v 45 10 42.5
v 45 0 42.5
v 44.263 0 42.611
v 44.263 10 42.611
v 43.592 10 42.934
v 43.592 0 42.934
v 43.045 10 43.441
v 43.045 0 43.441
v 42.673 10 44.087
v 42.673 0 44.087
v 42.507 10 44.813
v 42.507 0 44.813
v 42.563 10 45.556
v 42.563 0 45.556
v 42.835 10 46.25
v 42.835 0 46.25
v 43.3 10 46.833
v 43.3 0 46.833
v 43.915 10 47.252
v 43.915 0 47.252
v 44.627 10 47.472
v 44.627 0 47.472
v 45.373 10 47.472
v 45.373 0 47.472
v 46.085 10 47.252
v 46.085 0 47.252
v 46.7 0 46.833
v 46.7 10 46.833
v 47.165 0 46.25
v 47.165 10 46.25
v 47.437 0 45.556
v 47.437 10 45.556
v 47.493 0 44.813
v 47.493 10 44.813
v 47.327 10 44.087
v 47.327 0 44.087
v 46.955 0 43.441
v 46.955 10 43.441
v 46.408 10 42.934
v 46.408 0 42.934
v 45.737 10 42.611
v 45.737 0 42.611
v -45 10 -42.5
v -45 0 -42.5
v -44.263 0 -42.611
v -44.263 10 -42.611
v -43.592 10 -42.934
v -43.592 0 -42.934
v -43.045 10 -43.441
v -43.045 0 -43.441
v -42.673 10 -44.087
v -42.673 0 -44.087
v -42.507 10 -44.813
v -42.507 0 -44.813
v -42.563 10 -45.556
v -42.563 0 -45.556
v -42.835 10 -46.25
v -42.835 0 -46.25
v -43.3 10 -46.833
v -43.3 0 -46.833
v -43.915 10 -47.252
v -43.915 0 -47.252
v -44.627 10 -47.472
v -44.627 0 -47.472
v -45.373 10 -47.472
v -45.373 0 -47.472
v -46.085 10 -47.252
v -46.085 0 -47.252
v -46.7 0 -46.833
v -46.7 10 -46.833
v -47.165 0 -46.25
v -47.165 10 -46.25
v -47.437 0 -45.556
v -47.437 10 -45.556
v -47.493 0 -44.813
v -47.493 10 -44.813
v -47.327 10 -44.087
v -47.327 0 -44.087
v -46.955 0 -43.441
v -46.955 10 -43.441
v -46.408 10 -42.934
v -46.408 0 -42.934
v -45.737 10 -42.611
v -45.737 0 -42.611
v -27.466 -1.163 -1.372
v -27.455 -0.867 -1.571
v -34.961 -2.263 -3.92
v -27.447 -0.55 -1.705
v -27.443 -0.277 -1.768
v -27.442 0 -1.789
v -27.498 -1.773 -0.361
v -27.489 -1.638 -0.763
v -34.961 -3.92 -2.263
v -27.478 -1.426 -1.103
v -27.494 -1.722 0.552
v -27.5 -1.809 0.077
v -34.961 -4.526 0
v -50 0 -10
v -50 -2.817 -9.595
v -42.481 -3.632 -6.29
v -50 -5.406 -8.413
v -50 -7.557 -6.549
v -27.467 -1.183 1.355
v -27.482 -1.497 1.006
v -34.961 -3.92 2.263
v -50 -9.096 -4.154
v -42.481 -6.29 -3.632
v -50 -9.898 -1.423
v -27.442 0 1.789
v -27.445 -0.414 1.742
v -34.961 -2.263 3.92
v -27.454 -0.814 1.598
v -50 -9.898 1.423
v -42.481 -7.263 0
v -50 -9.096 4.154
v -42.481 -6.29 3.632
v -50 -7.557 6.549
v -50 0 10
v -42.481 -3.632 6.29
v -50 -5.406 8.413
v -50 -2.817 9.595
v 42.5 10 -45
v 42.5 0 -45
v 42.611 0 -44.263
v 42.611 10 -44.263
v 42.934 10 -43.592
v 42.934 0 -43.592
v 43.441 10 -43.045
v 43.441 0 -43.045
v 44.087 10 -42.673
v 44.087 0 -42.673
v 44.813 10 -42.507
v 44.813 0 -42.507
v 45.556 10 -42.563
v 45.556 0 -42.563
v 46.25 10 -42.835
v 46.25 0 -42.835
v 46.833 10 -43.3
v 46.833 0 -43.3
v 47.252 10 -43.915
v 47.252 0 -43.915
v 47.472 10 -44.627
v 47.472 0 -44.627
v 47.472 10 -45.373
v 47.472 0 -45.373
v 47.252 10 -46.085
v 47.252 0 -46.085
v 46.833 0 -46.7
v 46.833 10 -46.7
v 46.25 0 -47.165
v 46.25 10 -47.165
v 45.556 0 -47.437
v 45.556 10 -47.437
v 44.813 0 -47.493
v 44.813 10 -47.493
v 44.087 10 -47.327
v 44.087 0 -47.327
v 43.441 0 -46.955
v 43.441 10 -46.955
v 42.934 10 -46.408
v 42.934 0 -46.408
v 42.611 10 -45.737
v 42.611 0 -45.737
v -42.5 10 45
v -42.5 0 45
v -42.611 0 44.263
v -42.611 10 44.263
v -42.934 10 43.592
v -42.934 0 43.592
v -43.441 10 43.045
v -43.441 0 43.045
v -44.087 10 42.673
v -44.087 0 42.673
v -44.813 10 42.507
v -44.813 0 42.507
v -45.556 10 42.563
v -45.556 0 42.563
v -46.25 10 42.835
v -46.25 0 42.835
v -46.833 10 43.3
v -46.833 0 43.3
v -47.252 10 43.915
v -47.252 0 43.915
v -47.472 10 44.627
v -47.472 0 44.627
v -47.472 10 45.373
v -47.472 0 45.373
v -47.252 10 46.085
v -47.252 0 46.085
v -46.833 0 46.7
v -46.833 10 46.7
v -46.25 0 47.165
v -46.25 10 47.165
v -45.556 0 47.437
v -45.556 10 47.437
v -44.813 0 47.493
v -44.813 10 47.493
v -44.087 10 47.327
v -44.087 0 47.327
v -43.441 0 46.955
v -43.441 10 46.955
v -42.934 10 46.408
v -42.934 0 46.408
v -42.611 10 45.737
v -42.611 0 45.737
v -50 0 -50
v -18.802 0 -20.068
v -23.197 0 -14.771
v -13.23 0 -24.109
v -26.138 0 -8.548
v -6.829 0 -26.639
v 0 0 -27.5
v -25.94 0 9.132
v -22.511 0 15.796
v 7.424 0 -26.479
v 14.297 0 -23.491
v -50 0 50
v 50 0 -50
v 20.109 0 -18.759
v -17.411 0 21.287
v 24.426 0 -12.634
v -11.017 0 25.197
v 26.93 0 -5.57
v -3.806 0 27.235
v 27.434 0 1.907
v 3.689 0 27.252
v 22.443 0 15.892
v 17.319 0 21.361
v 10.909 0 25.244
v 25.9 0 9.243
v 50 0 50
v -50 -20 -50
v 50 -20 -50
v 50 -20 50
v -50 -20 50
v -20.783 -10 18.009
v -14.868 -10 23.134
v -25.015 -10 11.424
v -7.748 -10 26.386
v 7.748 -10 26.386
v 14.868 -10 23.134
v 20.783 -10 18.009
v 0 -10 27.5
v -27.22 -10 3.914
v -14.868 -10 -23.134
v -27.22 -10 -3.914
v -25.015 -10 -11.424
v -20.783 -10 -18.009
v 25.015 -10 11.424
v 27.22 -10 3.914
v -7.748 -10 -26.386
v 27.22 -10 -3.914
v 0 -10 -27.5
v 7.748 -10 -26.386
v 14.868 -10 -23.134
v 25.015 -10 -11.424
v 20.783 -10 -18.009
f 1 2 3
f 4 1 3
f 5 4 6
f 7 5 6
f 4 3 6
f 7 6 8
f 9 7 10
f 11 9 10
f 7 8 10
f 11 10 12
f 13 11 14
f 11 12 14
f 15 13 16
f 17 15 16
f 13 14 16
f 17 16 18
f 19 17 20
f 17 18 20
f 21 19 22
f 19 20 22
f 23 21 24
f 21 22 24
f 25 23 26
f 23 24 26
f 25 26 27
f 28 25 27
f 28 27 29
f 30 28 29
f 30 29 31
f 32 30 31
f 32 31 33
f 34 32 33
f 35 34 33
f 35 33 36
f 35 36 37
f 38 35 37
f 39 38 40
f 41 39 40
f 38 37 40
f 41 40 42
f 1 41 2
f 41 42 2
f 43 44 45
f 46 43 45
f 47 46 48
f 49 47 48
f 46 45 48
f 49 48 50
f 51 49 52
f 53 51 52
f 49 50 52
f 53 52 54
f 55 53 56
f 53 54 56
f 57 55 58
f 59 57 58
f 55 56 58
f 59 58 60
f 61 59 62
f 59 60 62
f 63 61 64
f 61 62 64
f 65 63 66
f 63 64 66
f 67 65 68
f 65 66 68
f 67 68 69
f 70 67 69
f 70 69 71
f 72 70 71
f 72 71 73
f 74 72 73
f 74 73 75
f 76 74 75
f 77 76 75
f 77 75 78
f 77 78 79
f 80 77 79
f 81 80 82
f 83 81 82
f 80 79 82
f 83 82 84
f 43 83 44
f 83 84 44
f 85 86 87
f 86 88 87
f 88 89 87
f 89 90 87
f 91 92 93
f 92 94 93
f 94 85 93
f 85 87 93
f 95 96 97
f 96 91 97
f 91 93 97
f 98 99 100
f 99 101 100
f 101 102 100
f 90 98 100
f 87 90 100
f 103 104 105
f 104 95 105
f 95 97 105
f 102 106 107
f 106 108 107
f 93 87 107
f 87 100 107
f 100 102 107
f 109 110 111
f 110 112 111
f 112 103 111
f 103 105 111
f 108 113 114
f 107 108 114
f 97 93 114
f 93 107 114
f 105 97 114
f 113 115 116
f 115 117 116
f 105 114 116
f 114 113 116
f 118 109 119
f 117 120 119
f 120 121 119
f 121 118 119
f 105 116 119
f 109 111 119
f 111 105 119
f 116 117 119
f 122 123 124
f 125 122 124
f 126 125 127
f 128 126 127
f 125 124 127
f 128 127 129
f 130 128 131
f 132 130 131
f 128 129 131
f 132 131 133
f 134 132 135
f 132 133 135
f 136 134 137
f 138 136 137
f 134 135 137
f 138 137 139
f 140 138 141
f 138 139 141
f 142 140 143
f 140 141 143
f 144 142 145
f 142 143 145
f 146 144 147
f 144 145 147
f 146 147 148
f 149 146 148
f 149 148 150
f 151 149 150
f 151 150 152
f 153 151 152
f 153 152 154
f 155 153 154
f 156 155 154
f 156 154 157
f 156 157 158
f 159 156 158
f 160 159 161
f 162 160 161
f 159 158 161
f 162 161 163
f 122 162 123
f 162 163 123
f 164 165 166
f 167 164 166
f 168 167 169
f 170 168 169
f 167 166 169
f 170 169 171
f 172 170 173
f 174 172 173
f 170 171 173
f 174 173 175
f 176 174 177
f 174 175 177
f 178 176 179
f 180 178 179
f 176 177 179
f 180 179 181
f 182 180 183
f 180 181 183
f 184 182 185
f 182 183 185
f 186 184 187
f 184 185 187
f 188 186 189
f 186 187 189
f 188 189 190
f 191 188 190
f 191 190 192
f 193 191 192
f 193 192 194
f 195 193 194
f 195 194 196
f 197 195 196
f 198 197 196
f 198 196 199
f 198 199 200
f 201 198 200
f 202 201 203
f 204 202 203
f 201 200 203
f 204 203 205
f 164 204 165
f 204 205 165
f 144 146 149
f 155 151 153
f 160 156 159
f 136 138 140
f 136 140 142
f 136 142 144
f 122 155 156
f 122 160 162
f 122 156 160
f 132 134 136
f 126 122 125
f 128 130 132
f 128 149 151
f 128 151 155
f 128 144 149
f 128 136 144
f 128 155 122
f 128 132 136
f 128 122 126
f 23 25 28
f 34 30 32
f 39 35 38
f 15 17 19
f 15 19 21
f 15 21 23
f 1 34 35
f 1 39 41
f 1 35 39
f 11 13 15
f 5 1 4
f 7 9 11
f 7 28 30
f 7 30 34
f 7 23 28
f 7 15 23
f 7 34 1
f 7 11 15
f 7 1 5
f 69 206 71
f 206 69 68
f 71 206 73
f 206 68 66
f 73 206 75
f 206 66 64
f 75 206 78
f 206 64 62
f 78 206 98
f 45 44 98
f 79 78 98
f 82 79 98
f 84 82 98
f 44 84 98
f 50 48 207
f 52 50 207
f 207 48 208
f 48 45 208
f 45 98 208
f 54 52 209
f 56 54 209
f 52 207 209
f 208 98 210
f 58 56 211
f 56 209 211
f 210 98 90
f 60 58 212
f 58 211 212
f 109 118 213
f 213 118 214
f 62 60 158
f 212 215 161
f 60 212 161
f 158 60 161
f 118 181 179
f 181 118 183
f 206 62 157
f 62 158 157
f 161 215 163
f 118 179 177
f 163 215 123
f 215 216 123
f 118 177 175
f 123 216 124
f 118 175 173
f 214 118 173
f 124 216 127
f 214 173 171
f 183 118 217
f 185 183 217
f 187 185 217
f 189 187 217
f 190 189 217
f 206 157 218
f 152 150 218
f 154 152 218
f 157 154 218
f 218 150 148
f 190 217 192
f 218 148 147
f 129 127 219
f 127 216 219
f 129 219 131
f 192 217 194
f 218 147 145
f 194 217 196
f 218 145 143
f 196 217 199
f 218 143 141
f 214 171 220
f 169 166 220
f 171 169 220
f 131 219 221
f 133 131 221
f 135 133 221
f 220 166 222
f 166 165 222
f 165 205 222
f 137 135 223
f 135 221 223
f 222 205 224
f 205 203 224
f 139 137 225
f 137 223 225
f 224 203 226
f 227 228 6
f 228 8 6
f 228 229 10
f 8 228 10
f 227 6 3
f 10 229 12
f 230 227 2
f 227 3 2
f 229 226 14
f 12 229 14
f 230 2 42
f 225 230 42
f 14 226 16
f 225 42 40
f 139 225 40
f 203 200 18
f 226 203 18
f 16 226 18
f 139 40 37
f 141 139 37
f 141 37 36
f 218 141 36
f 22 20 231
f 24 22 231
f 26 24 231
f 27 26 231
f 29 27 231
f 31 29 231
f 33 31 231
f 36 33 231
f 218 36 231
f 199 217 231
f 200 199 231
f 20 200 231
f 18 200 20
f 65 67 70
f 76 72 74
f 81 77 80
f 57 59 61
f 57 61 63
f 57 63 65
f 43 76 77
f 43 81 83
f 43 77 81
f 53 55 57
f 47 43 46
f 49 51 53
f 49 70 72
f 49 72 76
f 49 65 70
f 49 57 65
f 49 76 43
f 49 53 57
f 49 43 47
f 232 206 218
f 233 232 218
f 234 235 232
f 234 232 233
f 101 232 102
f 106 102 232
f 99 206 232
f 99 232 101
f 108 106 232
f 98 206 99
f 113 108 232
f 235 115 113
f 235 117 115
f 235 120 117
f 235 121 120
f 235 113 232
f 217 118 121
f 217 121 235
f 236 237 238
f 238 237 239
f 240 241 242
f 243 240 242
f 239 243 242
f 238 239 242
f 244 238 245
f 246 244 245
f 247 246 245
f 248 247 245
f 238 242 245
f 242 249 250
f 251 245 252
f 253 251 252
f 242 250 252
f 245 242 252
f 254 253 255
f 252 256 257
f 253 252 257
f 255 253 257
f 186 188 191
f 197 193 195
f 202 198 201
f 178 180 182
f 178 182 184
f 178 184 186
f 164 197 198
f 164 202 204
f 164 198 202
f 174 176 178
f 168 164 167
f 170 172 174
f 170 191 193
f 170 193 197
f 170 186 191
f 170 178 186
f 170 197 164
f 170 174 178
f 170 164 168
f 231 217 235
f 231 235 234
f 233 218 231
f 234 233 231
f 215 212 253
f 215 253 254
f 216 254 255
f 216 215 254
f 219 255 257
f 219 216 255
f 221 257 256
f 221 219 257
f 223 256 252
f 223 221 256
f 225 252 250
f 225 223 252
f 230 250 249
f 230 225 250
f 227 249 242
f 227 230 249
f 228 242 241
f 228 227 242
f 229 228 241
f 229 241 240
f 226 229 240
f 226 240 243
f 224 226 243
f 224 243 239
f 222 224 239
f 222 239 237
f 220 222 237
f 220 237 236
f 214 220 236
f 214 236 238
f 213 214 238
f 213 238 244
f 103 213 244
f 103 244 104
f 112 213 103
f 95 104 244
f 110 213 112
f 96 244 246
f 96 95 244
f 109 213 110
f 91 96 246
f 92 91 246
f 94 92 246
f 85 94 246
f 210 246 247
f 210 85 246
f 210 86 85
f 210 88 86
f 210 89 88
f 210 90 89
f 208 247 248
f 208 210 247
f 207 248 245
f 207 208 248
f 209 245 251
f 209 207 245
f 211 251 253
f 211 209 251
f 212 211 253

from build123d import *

# Parameters (mm, degrees)
SKETCH1_W           = 80
SKETCH1_H           = 80
BOSS_EXTRUDE1_DEPTH = 15
BOSS_EXTRUDE1_DRAFT = -5
SKETCH2_W           = 13.5
SKETCH2_H           = 72
SKETCH2_W_2         = 72
SKETCH2_H_2         = 13.5
CUT_EXTRUDE1_DEPTH  = 10
CUT_EXTRUDE1_TAPER  = 5
SKETCH3_R           = 27.5
BOSS_EXTRUDE2_DEPTH = 10
SKETCH4_W           = 100
SKETCH4_H           = 100
BOSS_EXTRUDE3_DEPTH = 20
SKETCH5_R           = 2.5
BOSS_EXTRUDE4_DEPTH = 10
CIRPATTERN1_COUNT   = 4
SKETCH6_R           = 10
CUT_EXTRUDE2_DEPTH  = 25
CUT_EXTRUDE2_DRAFT  = -20


with BuildPart() as part:
    # Sketch1 → Boss-Extrude1 (with draft: the straight prism first)
    with BuildSketch(Plane(origin=(0, 0, 0), x_dir=(1, 0, 0), z_dir=(0, 1, 0))):
        Rectangle(SKETCH1_W, SKETCH1_H)
    extrude(amount=BOSS_EXTRUDE1_DEPTH)
    # Boss-Extrude1: the draft: its side faces are tilted about the plane it starts from
    boss_extrude1_sides = [part.faces().sort_by_distance(p)[0] for p in [
        (0, 7.5, 40),
        (40, 7.5, 0),
        (0, 7.5, -40),
        (-40, 7.5, 0),
    ]]
    draft(boss_extrude1_sides, Plane(origin=(0, 0, 0), x_dir=(1, 0, 0), z_dir=(0, 1, 0)), BOSS_EXTRUDE1_DRAFT)

    # Sketch2 → Cut-Extrude1 (cut)
    with BuildSketch(Plane(origin=(0, 15, 0), x_dir=(1, 0, 0), z_dir=(0, 1, 0))):
        Rectangle(SKETCH2_W, SKETCH2_H)
        Rectangle(SKETCH2_W_2, SKETCH2_H_2)
    extrude(amount=-CUT_EXTRUDE1_DEPTH, taper=CUT_EXTRUDE1_TAPER, mode=Mode.SUBTRACT)

    # Sketch3 → Boss-Extrude2 (add)
    with BuildSketch(Plane.XZ):
        with Locations(Location((0, 0, 0), (0, 0, 270))):  # turned: the seam where the file's is
            Circle(SKETCH3_R)
    extrude(amount=BOSS_EXTRUDE2_DEPTH)


with BuildPart() as body_2:
    # Sketch4 → Boss-Extrude3 (new body)
    with BuildSketch(Plane.XZ):
        Rectangle(SKETCH4_W, SKETCH4_H)
    extrude(amount=BOSS_EXTRUDE3_DEPTH)

    # Combine1: cut part
    add(part.part, mode=Mode.SUBTRACT)

    # Sketch5 → Boss-Extrude4 (add)
    with BuildSketch(Plane(origin=(0, 0, 0), x_dir=(1, 0, 0), z_dir=(0, 1, 0))):
        with Locations(Location((-45, 45, 0), (0, 0, 270))):  # turned: the seam where the file's is
            Circle(SKETCH5_R)
    boss_extrude4 = extrude(amount=BOSS_EXTRUDE4_DEPTH)

    # CirPattern1: Boss-Extrude4 ×4 about axis
    cirpattern1_axis = Axis((0, 0, 0), (0, 1, 0))
    for i in range(1, CIRPATTERN1_COUNT):
        add(boss_extrude4.rotate(cirpattern1_axis, i * 360 / CIRPATTERN1_COUNT))


with BuildPart() as cut_extrude2_tool:
    # Sketch6 → Cut-Extrude2 (with draft: the straight prism first)
    with BuildSketch(Plane.ZY.offset(50)):
        Circle(SKETCH6_R)
    extrude(amount=-CUT_EXTRUDE2_DEPTH)
    # Cut-Extrude2: the draft: its side faces are tilted about the plane it starts from
    cut_extrude2_sides = [cut_extrude2_tool.faces().sort_by_distance(p)[0] for p in [
        (-37.5, 0, -10),
    ]]
    draft(cut_extrude2_sides, Plane.ZY.offset(50), CUT_EXTRUDE2_DRAFT)


with BuildPart() as body_2_1:
    add(body_2.part)

    # Cut-Extrude2: cut by cut_extrude2_tool
    add(cut_extrude2_tool.part, mode=Mode.SUBTRACT)


solid = body_2_1.part
